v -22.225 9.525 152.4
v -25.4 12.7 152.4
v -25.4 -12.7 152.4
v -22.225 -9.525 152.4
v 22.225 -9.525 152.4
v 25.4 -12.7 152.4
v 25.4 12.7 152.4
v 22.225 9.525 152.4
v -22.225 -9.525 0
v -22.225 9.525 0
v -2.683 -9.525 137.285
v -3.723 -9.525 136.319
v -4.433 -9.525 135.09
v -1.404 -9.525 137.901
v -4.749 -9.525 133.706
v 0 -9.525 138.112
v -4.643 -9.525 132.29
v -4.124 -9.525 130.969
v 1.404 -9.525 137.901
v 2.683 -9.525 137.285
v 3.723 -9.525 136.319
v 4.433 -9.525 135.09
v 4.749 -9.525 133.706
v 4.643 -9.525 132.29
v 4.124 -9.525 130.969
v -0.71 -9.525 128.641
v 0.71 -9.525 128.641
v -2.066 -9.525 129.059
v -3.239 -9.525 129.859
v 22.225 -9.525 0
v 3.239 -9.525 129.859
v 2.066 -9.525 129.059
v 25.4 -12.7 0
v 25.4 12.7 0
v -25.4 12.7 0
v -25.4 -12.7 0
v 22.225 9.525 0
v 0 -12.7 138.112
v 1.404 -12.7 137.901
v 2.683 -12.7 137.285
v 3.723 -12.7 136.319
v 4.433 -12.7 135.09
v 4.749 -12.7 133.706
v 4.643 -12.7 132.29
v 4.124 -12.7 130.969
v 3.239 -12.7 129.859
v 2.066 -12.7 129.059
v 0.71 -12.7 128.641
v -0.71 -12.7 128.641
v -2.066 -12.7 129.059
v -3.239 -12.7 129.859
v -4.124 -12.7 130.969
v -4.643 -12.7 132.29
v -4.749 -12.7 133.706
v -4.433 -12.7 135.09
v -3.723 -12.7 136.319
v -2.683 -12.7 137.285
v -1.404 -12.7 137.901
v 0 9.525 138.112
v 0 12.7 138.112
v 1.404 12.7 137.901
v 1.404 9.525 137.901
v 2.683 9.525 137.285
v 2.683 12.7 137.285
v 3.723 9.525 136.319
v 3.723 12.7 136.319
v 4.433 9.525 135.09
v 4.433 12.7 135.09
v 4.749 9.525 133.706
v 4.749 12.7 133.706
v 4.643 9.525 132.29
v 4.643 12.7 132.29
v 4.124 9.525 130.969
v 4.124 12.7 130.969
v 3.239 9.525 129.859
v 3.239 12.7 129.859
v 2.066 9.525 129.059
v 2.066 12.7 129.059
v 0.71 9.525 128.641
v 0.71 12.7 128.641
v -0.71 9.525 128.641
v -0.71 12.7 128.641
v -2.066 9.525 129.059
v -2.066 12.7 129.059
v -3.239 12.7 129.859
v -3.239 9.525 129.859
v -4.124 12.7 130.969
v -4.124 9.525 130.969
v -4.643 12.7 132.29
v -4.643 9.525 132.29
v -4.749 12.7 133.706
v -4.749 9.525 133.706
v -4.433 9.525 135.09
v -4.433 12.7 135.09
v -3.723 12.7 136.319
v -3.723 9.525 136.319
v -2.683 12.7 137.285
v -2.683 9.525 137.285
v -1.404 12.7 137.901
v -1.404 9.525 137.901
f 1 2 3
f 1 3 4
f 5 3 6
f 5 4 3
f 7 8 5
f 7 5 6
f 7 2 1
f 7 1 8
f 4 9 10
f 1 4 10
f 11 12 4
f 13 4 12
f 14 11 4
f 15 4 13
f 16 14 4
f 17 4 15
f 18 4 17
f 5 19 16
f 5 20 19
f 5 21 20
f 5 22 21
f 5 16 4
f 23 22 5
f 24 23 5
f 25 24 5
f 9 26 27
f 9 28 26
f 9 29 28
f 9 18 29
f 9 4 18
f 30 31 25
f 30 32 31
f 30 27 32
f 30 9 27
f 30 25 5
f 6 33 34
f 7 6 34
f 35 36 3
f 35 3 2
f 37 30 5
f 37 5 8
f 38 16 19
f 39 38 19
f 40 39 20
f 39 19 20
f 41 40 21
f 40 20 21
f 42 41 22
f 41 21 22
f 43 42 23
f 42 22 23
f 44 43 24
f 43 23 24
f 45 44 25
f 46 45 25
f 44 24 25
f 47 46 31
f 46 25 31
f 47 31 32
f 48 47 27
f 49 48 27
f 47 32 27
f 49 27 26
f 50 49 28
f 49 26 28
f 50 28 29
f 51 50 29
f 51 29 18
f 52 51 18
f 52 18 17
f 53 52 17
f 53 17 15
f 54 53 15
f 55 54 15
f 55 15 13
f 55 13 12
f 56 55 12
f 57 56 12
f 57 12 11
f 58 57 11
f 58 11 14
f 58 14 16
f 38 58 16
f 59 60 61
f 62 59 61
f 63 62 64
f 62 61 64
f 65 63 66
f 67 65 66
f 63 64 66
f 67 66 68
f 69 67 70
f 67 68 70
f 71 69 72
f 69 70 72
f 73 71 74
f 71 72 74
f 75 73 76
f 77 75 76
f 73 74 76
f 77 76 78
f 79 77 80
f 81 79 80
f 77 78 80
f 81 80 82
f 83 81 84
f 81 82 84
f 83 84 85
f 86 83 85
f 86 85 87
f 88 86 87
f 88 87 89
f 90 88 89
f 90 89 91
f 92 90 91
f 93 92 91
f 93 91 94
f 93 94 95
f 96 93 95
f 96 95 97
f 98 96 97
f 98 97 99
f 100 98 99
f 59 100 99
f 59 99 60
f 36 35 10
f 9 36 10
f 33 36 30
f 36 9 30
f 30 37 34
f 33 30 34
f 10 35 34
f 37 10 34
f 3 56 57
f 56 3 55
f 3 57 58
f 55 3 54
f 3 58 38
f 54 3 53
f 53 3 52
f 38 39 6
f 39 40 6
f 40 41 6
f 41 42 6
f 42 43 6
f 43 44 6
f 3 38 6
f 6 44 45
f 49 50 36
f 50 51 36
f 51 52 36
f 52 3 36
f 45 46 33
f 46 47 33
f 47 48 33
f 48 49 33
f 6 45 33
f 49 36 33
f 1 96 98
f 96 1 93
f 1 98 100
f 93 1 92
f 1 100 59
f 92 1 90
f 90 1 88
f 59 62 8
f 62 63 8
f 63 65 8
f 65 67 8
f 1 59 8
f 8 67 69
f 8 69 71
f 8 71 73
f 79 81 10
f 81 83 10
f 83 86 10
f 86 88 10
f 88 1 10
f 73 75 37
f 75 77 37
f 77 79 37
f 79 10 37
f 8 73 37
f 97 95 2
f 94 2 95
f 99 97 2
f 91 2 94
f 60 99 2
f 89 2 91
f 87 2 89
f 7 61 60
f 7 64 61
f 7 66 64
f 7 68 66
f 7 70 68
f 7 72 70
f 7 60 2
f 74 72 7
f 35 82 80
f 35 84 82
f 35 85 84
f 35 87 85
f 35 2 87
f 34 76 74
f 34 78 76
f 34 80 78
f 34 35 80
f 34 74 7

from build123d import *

# Parameters (mm, degrees)
SKETCH1_W           = 50.8
SKETCH1_H           = 25.4
SKETCH1_W_2         = 44.45
SKETCH1_H_2         = 19.05
BOSS_EXTRUDE1_DEPTH = 152.4
SKETCH2_R           = 4.7625
CUT_EXTRUDE1_DEPTH  = 157.576115675


with BuildPart() as part:
    # Sketch1 → Boss-Extrude1 (new body)
    with BuildSketch(Plane.XY):
        Rectangle(SKETCH1_W, SKETCH1_H)
        Rectangle(SKETCH1_W_2, SKETCH1_H_2, mode=Mode.SUBTRACT)
    extrude(amount=BOSS_EXTRUDE1_DEPTH)

    # Sketch2 → Cut-Extrude1 (cut, through all)
    with BuildSketch(Plane(origin=(0, 12.7, 0), x_dir=(1, 0, 0), z_dir=(0, 1, 0))):
        with Locations(Location((0, -133.35, 0), (0, 0, 270))):
            Circle(SKETCH2_R)
    extrude(amount=-CUT_EXTRUDE1_DEPTH, mode=Mode.SUBTRACT)


solid = part.part
